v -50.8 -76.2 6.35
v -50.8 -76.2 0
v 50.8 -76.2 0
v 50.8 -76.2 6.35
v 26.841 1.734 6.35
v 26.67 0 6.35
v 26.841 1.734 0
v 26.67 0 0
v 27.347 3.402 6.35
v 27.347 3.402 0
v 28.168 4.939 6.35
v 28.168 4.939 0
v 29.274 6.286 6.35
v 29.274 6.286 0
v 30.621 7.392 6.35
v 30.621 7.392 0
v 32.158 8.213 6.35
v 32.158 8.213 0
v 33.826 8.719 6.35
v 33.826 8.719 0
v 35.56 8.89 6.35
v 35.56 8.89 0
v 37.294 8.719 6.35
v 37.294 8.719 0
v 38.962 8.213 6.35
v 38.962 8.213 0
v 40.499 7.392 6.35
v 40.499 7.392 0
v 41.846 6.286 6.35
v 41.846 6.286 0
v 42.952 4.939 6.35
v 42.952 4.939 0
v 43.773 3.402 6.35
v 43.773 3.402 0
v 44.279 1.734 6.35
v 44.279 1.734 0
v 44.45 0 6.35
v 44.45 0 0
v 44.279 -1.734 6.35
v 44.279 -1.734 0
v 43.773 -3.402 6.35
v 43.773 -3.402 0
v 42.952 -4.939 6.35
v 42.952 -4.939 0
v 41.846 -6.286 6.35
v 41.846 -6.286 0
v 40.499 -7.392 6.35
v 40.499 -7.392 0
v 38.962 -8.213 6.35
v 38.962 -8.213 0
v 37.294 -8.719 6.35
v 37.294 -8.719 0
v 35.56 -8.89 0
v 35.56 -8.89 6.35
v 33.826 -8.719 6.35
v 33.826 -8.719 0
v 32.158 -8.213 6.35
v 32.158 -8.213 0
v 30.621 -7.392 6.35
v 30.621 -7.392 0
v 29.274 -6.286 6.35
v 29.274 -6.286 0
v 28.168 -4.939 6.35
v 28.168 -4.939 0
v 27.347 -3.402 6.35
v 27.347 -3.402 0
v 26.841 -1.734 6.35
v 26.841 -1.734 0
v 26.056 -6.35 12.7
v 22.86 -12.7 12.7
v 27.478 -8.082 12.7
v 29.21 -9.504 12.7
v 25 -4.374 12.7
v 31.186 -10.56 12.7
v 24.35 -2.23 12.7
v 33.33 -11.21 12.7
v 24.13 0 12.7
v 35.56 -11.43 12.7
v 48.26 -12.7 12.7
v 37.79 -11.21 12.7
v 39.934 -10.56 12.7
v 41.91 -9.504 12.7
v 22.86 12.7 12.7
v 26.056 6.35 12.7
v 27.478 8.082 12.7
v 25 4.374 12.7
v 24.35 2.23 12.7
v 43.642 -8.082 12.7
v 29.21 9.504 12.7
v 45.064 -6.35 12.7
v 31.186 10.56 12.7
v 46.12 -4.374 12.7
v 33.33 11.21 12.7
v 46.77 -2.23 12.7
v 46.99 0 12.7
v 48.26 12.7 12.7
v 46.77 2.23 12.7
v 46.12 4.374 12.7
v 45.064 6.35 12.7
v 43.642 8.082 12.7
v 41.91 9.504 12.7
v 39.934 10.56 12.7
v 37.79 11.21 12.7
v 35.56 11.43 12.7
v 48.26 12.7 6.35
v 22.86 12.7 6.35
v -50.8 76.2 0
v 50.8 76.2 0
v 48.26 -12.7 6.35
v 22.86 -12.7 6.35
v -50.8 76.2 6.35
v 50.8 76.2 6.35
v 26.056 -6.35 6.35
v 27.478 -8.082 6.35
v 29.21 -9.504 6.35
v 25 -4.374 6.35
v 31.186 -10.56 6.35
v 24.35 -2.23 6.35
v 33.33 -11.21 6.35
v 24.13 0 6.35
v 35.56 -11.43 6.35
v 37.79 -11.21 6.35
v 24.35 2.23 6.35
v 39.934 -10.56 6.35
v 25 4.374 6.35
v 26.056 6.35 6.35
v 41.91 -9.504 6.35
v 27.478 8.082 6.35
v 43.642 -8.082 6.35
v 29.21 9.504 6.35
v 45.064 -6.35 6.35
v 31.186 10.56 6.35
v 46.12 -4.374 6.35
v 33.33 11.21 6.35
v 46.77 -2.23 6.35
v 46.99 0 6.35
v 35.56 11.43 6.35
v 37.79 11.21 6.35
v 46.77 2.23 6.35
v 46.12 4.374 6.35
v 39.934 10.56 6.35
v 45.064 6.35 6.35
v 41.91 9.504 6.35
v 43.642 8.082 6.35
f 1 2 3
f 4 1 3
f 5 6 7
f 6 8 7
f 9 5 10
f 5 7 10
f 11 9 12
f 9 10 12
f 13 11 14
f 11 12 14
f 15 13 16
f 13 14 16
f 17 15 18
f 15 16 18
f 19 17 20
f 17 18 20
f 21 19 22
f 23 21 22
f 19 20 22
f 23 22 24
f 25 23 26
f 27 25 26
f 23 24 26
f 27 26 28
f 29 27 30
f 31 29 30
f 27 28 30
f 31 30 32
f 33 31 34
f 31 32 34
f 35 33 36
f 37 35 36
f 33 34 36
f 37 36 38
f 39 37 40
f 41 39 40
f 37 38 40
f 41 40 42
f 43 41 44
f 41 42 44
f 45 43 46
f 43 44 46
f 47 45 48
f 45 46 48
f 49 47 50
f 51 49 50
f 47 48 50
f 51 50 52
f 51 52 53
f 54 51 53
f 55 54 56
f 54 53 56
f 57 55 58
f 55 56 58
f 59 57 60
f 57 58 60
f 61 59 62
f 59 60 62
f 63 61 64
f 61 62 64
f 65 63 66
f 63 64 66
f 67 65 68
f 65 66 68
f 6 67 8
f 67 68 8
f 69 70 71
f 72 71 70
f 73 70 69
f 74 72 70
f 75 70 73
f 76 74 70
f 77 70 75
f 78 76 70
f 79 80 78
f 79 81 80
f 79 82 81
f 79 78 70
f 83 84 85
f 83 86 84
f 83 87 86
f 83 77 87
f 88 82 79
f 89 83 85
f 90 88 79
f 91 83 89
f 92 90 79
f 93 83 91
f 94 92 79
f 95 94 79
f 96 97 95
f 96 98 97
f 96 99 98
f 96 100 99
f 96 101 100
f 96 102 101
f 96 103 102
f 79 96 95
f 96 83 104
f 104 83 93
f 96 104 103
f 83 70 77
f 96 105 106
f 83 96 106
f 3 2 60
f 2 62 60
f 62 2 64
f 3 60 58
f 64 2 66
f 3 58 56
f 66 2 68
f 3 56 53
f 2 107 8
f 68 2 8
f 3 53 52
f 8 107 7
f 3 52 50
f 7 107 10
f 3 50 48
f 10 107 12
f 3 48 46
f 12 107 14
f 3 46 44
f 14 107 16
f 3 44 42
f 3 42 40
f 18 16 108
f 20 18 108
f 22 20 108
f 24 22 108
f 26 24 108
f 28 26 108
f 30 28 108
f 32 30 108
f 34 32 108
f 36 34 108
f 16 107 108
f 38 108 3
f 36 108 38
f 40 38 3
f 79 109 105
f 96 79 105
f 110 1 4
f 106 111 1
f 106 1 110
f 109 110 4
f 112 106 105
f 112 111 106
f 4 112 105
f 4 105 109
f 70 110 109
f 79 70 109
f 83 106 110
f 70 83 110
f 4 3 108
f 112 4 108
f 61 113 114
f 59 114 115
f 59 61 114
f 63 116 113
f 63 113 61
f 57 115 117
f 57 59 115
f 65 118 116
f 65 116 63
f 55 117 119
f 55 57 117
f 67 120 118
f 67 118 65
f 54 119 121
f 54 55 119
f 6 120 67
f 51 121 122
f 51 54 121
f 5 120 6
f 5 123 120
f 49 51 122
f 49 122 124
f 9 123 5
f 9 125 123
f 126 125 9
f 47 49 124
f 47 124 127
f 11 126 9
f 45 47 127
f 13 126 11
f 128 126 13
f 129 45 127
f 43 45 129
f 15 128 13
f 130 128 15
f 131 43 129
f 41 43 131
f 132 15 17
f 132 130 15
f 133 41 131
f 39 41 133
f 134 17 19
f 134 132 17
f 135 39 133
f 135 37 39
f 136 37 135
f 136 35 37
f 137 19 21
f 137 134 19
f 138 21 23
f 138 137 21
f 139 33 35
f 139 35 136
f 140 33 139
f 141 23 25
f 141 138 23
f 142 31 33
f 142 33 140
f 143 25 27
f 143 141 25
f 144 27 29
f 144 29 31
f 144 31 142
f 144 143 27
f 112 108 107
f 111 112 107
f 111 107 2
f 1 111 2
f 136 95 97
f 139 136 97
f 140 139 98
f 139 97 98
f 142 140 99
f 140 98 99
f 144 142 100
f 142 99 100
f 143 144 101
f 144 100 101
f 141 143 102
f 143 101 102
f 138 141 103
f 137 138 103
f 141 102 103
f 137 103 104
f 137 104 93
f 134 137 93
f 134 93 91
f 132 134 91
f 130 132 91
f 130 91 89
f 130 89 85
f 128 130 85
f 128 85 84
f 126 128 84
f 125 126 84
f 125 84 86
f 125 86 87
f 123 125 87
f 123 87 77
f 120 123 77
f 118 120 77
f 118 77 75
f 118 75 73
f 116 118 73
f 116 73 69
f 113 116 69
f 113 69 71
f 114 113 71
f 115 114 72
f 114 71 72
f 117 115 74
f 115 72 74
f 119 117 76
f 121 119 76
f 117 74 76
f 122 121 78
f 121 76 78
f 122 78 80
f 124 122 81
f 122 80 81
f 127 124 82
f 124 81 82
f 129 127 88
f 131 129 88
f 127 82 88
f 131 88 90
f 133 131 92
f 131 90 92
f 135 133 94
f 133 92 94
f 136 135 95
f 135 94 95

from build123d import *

# Parameters (mm, degrees)
F1_DEPTH       = 6.35
F2_DEPTH       = 12.7
F4_D           = 17.78
F4_CBORE_D     = 22.86
F4_CBORE_DEPTH = 6.35


with BuildPart() as f1:
    # F0 (on Top) → F1 (new body)
    with BuildSketch(Plane.XY):
        Polygon((50.8, 76.2), (-50.8, 76.2), (-50.8, -76.2), (50.8, -76.2), (50.8, 0), align=None)
        Polygon((48.26, 12.7), (48.26, 0), (48.26, -12.7), (22.86, -12.7), (22.86, 12.7), align=None, mode=Mode.SUBTRACT)
    extrude(amount=F1_DEPTH)

    # F0 (on Top) → F2 (join)
    with BuildSketch(Plane.XY):
        Polygon((48.26, -12.7), (48.26, 0), (48.26, 12.7), (22.86, 12.7), (22.86, -12.7), align=None)
    extrude(amount=F2_DEPTH)

    # F4 (through all)
    with Locations(Plane.XY.offset(12.7)):
        with Locations((35.56, 0)):
            CounterBoreHole(F4_D / 2, F4_CBORE_D / 2, F4_CBORE_DEPTH)


solid = f1.part
